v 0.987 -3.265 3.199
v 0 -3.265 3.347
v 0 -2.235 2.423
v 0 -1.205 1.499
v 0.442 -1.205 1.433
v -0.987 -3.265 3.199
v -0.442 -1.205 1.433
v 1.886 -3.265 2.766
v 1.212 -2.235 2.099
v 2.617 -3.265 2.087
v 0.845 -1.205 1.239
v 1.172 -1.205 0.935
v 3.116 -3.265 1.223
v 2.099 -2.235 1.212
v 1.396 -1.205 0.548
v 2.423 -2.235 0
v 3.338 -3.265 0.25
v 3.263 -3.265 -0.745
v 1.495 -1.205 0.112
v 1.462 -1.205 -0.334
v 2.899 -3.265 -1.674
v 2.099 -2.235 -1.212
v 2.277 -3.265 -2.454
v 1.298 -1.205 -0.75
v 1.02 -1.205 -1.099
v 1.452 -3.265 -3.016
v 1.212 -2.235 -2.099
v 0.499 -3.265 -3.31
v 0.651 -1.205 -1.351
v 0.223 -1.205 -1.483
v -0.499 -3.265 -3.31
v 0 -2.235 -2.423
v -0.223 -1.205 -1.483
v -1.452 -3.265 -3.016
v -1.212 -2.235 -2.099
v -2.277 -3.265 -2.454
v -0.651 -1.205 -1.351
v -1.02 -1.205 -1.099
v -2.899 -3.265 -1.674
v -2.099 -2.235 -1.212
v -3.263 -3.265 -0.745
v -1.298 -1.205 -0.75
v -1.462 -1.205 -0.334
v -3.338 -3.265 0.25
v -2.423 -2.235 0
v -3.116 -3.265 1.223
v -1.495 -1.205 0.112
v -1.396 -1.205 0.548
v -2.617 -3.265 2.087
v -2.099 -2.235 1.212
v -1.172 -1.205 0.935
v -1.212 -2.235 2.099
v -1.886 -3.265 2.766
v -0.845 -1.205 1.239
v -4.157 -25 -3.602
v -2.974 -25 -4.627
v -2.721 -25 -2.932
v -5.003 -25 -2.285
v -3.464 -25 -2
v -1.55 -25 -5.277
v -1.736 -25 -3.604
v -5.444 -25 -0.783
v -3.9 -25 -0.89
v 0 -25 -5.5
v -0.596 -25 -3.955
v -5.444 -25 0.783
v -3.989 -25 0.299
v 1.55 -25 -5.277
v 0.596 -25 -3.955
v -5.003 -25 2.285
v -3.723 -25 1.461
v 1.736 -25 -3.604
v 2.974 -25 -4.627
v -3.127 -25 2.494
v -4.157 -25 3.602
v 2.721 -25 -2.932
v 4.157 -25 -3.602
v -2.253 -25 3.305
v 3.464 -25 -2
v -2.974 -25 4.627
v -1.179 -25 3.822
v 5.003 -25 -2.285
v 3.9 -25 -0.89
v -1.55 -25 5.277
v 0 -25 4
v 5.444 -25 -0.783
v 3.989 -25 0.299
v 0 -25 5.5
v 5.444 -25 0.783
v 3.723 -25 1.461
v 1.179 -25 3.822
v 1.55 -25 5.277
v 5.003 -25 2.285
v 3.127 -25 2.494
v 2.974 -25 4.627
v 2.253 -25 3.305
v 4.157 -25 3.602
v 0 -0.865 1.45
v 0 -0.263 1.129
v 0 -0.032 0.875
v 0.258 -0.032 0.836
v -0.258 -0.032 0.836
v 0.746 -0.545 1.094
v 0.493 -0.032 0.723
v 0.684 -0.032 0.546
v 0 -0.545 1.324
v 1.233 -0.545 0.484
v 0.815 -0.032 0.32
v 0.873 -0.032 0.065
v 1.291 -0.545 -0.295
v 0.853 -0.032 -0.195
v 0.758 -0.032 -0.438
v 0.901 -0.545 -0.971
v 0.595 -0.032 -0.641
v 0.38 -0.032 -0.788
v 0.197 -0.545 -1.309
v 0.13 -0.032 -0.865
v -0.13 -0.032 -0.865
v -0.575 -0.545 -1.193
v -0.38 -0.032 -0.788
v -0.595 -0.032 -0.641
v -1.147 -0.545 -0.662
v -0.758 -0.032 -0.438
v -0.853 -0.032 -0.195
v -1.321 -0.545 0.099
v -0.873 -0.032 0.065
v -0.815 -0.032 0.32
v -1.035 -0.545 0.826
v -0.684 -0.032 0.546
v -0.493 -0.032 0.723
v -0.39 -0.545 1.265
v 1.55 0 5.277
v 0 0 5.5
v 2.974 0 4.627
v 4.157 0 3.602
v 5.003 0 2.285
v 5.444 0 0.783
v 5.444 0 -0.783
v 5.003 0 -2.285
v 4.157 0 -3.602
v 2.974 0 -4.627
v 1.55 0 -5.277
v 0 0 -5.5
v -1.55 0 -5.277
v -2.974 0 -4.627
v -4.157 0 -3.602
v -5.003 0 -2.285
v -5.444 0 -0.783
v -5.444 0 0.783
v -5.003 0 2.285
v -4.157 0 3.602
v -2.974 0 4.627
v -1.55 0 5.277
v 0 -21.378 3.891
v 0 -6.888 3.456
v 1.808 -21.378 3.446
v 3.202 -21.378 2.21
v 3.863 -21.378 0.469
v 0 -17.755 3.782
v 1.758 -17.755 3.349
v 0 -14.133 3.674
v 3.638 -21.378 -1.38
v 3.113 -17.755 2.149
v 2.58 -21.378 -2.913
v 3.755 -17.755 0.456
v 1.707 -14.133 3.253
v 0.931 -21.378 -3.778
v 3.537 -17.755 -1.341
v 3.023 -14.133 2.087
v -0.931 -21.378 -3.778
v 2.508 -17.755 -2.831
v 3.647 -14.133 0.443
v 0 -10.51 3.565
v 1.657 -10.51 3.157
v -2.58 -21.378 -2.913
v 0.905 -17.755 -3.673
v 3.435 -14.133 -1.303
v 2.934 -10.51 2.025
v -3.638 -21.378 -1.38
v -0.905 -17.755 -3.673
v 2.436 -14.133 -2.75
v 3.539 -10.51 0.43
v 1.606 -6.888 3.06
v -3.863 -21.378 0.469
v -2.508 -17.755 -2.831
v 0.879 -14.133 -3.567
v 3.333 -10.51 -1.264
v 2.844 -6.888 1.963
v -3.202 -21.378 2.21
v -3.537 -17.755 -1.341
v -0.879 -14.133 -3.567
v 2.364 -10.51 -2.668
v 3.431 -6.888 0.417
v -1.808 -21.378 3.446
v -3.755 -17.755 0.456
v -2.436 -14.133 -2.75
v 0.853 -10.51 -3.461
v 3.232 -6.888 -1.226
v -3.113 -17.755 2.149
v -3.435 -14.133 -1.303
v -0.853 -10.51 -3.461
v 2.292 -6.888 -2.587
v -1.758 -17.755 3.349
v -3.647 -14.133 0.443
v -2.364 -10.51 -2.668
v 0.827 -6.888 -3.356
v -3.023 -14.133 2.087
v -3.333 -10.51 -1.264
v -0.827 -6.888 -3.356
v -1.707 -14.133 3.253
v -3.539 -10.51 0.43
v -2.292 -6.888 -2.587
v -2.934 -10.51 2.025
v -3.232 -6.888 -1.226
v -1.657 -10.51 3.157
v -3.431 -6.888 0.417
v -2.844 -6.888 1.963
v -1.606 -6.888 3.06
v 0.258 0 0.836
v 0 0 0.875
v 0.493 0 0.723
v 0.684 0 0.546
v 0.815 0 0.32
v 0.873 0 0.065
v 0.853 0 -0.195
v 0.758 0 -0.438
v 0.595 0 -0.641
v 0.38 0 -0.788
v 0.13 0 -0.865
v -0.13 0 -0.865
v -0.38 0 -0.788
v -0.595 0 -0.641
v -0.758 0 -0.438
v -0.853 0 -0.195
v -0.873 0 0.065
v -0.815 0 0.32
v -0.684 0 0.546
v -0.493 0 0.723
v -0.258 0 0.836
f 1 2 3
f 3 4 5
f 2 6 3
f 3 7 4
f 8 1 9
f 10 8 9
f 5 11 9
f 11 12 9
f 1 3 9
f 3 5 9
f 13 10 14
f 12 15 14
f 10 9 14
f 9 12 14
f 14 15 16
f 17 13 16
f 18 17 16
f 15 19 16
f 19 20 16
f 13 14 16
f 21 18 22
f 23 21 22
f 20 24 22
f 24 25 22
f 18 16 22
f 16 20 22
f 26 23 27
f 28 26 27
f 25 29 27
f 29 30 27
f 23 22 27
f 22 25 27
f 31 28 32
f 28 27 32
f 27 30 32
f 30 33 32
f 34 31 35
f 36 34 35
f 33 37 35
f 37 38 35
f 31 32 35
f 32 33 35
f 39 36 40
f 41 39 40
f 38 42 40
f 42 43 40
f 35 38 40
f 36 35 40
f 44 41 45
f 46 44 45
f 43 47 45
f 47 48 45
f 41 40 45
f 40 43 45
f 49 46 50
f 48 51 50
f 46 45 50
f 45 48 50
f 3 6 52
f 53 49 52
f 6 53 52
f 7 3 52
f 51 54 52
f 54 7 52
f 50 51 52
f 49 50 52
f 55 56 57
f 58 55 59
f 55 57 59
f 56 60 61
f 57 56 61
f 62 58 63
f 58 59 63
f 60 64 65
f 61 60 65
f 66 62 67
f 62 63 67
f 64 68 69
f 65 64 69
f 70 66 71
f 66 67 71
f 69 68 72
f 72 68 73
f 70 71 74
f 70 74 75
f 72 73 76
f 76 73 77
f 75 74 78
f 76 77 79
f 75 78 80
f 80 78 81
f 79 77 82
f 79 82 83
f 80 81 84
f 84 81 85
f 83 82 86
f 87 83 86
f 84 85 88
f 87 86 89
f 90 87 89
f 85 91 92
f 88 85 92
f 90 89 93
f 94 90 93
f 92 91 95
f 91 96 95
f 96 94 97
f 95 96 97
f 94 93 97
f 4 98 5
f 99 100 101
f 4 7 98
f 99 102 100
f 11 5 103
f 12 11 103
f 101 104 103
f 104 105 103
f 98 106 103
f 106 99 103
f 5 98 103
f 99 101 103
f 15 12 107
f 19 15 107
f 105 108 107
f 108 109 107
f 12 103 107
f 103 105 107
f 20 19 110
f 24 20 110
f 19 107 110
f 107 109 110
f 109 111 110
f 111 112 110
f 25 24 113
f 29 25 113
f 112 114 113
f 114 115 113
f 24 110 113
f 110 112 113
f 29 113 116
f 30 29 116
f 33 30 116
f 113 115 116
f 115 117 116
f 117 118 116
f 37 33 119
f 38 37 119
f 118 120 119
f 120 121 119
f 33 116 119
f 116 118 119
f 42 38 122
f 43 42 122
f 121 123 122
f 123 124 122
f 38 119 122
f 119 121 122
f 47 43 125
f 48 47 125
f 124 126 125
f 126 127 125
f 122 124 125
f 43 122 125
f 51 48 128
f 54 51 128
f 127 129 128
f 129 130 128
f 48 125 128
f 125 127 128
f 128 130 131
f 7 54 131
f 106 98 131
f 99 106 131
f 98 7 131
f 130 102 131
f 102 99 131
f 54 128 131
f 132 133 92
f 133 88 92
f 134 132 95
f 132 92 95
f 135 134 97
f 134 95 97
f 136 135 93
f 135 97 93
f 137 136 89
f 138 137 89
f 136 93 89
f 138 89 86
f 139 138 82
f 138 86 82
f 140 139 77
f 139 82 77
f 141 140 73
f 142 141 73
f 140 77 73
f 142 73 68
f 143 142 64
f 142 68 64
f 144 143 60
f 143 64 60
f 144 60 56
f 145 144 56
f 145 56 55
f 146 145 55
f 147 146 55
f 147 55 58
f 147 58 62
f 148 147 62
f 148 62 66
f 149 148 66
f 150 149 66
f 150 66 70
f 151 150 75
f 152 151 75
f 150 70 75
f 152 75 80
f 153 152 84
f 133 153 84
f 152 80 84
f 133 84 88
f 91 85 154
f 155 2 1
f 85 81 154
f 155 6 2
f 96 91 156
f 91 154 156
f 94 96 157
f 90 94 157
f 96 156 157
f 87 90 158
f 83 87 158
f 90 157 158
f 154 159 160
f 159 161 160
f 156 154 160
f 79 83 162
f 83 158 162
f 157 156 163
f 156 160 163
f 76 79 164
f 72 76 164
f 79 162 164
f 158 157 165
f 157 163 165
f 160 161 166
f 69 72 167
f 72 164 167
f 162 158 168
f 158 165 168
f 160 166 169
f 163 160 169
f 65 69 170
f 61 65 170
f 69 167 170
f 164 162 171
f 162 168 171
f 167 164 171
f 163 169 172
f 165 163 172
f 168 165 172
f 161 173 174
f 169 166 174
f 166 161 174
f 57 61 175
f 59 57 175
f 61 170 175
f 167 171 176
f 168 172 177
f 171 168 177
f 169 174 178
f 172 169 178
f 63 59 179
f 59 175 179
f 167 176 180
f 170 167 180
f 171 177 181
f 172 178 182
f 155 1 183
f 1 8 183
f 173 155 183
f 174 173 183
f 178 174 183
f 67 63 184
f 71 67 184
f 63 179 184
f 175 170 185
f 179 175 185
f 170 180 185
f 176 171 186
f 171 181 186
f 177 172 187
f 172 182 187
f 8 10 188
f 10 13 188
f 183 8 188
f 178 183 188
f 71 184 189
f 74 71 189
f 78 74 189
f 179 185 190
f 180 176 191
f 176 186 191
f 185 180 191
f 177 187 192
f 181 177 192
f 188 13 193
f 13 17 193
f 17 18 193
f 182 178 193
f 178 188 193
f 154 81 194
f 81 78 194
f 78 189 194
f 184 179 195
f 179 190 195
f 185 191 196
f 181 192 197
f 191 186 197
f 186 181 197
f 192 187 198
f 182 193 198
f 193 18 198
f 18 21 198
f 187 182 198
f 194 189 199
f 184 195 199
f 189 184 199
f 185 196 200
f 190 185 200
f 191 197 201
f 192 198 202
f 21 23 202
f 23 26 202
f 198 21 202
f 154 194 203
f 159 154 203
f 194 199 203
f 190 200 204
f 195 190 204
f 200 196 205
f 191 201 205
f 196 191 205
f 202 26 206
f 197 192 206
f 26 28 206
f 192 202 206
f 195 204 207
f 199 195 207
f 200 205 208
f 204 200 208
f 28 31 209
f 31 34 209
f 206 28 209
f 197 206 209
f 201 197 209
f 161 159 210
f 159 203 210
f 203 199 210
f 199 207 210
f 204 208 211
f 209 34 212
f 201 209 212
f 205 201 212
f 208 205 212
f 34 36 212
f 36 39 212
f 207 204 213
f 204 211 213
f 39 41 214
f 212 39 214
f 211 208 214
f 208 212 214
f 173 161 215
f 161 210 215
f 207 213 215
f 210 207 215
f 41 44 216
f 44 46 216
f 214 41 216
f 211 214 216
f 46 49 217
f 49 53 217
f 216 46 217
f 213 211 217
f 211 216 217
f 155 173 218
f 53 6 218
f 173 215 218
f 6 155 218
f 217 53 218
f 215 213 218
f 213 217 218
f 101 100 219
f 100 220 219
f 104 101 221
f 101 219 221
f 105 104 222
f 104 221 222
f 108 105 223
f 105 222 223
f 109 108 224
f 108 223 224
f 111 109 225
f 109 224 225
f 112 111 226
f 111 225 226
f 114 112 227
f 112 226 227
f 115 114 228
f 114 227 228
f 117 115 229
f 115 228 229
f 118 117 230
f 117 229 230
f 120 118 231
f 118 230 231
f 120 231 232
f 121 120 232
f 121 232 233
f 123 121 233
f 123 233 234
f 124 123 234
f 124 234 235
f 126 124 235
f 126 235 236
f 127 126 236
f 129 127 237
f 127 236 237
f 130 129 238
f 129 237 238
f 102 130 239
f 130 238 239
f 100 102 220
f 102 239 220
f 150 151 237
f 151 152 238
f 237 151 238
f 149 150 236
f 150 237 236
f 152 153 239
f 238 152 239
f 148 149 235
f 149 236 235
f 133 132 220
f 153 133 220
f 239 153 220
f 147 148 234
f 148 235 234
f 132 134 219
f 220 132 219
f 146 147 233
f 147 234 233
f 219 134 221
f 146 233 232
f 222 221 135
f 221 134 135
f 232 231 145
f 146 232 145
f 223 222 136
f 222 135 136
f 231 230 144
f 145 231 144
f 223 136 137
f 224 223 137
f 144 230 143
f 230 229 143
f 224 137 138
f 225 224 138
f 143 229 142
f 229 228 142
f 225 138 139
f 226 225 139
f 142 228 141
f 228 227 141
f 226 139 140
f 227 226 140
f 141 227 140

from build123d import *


with BuildPart() as f1:
    # F0 (on Right) → F1 (revolve)
    with BuildSketch(Plane.YZ):
        with BuildLine():
            Line((-0.031651, 0.875), (0, 0.875))
            Line((0, 0.875), (0, 5.5))
            Line((0, 5.5), (-25, 5.5))
            Line((-25, 5.5), (-25, 4))
            Line((-25, 4), (-3.26508, 3.347329))
            Line((-3.26508, 3.347329), (-1.204977, 1.499324))
            ThreePointArc((-1.204977, 1.499324), (-0.545392, 1.324208), (-0.031651, 0.875))
        make_face()
    revolve(axis=Axis((0, -12.5, 0), (0, 1, 0)))


solid = f1.part
